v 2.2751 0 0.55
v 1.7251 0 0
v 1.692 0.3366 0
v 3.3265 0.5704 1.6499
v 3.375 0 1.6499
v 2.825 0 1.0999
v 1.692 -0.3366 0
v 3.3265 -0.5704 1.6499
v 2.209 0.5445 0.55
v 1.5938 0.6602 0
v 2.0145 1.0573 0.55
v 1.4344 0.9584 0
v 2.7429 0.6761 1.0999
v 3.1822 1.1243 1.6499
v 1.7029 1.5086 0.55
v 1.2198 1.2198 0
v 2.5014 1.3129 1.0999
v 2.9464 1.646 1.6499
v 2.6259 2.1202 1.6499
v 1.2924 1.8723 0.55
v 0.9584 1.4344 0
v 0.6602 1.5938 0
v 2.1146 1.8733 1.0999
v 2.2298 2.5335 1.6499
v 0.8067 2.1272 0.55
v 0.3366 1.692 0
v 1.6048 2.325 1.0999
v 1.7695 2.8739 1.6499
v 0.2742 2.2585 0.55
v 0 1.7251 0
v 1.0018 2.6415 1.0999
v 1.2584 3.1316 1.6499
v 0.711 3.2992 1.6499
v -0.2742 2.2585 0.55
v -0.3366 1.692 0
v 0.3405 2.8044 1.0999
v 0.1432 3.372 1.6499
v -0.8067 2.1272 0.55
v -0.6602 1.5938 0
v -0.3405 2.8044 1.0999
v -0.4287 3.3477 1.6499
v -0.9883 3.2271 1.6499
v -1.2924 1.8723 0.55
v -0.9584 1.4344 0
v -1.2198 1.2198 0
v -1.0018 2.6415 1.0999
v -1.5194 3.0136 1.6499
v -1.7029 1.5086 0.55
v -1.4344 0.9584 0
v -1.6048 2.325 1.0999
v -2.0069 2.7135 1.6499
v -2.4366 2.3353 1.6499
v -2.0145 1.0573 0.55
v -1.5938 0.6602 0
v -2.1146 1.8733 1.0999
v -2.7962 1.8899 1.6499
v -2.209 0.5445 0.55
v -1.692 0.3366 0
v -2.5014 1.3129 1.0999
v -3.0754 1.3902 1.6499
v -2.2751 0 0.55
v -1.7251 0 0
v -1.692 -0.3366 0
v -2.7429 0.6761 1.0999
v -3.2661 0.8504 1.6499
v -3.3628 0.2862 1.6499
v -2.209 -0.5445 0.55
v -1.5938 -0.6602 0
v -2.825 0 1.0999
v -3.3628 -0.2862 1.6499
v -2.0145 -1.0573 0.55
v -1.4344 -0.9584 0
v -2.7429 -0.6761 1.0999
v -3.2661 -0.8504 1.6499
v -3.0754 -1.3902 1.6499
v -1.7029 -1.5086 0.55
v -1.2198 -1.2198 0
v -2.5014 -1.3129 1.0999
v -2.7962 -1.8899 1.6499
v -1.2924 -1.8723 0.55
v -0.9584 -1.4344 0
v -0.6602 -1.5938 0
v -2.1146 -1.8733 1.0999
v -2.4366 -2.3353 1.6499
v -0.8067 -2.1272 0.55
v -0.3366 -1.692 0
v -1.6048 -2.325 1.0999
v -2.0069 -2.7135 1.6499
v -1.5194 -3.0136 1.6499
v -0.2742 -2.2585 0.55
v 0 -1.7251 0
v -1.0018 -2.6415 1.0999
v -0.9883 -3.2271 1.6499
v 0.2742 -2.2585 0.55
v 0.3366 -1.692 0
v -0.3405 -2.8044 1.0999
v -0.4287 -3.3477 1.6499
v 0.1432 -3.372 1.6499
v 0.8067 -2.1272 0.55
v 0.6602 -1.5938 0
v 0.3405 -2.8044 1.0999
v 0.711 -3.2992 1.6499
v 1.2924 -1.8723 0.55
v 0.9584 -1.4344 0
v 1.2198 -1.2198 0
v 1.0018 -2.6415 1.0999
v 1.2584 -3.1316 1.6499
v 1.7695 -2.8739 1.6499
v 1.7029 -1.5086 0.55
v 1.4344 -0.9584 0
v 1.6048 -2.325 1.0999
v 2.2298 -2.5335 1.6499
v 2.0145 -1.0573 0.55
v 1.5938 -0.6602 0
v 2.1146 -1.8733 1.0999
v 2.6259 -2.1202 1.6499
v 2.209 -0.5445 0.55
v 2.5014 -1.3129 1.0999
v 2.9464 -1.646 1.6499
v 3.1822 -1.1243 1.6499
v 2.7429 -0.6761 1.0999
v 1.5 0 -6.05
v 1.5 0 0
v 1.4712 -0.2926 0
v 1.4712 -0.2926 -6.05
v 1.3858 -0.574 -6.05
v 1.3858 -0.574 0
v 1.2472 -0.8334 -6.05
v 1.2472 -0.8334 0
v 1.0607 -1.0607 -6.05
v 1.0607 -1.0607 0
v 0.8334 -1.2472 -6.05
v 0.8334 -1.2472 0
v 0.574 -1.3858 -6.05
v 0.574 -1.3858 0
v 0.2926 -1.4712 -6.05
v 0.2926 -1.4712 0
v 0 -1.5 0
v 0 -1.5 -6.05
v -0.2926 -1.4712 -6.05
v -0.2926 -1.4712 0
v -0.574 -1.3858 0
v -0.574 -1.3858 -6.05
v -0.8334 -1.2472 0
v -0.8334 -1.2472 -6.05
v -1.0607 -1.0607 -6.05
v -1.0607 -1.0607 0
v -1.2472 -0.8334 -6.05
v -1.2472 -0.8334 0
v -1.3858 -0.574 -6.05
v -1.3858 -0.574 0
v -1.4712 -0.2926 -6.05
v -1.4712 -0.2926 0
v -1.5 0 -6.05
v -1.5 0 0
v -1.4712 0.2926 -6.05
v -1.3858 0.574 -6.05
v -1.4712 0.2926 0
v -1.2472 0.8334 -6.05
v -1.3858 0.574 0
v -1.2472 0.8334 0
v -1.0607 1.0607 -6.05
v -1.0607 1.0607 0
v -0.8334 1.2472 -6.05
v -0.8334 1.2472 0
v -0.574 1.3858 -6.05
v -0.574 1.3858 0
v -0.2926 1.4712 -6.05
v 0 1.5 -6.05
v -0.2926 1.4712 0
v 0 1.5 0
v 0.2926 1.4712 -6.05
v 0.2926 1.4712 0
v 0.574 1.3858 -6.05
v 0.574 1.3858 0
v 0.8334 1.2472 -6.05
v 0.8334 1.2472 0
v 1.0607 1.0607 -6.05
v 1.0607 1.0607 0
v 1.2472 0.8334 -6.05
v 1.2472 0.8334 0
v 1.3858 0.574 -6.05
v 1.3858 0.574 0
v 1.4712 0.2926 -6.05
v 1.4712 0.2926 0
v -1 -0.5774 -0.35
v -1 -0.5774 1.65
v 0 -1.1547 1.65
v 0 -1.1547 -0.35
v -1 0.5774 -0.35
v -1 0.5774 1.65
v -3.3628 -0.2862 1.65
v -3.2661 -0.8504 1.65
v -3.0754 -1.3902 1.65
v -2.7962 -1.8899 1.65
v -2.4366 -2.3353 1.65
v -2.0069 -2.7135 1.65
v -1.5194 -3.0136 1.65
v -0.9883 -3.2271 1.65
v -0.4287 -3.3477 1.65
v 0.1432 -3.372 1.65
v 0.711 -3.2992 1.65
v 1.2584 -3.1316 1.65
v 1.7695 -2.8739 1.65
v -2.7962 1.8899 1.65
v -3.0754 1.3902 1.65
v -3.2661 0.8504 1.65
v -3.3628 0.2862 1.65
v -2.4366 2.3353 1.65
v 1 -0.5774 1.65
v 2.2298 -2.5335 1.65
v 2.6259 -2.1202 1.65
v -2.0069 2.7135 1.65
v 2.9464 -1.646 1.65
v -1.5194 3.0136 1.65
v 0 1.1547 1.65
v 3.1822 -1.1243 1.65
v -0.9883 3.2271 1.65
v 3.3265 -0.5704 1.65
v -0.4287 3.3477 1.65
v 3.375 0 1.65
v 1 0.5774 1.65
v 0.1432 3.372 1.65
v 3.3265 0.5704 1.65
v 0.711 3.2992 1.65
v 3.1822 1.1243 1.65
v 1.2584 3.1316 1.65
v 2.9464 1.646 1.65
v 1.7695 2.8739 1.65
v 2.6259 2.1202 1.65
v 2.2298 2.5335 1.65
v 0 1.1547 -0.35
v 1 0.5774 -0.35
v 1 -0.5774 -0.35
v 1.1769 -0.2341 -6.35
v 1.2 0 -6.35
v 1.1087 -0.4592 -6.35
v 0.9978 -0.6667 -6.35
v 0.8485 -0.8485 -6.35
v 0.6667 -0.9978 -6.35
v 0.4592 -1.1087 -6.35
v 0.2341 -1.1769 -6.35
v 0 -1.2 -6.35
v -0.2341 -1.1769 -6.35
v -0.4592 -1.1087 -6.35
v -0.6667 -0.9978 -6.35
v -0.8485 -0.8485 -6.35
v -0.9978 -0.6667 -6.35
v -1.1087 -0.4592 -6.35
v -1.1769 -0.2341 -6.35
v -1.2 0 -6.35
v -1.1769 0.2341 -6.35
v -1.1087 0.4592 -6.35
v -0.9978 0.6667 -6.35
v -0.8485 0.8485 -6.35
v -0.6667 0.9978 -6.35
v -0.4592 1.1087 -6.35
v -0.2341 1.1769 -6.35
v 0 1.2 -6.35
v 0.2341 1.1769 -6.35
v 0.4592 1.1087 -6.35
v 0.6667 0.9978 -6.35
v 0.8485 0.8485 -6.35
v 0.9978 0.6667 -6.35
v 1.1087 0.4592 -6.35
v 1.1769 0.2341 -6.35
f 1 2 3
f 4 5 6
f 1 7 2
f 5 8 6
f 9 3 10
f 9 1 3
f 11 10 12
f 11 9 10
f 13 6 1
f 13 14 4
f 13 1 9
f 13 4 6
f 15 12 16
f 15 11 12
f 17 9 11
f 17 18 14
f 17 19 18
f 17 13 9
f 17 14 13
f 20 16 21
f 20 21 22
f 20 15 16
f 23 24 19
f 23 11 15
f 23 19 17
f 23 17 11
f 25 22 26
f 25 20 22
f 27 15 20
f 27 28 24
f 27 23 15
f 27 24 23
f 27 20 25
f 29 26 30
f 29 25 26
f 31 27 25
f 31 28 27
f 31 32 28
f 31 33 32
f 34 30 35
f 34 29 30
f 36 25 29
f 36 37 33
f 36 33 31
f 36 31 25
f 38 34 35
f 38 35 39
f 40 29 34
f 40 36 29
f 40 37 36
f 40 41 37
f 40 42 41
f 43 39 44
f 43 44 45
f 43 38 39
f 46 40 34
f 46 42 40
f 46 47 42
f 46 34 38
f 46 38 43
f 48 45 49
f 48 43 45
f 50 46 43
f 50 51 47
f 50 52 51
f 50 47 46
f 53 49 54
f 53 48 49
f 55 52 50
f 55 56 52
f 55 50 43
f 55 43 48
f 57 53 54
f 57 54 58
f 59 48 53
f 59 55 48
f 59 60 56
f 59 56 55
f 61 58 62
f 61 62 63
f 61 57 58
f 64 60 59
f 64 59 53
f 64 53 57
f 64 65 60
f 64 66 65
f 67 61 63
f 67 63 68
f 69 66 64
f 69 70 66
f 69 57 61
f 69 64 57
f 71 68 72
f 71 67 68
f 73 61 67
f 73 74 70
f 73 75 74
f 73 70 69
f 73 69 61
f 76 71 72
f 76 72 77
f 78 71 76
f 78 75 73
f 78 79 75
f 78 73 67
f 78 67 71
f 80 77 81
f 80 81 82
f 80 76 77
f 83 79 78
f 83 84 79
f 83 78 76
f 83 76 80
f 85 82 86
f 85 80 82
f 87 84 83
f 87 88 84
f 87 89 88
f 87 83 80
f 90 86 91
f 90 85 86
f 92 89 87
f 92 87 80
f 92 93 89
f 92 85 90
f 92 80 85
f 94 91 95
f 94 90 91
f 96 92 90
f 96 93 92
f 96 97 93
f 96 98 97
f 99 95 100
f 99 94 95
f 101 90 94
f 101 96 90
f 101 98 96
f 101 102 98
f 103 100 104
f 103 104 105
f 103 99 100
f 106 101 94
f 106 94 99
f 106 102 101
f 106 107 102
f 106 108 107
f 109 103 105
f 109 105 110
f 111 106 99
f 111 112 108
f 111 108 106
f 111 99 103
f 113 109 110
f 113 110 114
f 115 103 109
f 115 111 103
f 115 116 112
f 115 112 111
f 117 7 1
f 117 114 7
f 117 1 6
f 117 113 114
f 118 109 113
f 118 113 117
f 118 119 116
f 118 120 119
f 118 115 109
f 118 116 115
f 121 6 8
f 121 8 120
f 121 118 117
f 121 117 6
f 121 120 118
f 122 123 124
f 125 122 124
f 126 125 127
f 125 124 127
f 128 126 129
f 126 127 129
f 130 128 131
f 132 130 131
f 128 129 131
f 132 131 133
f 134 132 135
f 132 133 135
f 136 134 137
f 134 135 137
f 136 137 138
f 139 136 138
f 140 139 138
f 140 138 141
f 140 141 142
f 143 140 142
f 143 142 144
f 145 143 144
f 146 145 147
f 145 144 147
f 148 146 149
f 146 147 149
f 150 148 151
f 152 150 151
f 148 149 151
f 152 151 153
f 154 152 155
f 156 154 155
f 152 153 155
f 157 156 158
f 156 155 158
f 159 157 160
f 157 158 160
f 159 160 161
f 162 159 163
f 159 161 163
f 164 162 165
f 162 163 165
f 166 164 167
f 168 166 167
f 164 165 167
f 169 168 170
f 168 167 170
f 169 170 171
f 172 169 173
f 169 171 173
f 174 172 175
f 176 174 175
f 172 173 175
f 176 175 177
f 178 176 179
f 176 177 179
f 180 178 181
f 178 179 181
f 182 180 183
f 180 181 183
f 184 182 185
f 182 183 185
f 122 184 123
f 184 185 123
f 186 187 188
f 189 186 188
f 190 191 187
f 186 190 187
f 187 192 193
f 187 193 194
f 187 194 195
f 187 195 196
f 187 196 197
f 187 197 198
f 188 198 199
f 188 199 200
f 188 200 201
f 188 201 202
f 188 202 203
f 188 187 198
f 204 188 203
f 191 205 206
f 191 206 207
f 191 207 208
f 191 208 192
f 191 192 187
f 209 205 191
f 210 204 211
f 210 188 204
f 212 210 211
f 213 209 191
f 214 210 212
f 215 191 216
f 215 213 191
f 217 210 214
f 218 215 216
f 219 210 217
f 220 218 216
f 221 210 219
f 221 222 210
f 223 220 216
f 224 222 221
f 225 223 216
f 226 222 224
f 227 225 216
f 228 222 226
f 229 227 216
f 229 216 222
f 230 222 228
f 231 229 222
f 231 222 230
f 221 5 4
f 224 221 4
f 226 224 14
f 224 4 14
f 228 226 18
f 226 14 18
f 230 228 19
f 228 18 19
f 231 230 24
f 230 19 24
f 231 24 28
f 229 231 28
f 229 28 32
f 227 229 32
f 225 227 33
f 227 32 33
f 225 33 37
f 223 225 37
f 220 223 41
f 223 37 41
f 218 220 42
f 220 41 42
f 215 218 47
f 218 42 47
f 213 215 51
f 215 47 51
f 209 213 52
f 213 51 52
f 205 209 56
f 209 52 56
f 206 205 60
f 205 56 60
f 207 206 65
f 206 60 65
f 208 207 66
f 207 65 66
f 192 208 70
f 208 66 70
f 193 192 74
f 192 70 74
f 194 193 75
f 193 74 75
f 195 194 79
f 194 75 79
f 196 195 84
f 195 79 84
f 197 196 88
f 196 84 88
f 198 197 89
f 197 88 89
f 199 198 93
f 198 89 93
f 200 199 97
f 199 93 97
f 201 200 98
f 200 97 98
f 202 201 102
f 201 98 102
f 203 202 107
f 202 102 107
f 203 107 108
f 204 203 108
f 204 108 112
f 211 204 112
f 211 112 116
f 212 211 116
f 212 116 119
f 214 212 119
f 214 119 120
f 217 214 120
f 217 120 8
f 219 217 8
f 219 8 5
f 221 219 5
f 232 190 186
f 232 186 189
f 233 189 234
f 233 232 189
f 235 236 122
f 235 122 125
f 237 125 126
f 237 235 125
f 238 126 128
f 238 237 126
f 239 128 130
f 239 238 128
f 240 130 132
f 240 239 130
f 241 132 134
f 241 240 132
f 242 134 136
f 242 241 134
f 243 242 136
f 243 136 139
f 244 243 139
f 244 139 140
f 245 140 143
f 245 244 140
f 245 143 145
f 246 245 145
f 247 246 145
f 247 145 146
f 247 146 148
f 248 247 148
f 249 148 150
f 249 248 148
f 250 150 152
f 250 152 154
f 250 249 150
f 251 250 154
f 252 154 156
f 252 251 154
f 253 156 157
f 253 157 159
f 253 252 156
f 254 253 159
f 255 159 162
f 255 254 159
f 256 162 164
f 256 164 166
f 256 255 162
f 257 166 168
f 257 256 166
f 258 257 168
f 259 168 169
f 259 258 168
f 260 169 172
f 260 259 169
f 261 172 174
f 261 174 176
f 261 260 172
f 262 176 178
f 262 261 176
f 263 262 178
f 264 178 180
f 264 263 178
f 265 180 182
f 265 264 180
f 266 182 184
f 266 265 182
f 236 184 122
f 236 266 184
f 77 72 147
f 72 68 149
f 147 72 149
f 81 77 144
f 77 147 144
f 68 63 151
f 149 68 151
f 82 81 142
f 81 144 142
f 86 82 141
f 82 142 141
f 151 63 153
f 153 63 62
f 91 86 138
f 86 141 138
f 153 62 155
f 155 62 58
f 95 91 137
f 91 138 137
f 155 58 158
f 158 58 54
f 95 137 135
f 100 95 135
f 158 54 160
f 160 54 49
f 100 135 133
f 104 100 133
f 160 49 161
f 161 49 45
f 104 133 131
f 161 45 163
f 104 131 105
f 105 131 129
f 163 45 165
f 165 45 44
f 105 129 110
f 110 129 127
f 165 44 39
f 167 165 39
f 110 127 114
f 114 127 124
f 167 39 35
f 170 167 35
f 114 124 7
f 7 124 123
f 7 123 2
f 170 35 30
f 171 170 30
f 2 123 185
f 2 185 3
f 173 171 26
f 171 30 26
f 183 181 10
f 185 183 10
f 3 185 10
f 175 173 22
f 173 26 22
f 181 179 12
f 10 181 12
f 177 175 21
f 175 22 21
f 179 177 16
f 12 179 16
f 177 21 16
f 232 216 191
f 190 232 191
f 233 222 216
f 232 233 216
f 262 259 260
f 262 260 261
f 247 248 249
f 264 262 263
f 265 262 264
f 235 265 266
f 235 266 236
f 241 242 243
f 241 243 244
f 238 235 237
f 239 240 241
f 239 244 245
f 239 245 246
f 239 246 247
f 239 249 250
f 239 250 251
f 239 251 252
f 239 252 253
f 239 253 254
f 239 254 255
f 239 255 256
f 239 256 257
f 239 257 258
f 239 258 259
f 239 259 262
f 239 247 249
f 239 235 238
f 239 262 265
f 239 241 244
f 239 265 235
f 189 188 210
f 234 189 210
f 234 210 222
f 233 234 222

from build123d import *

# Parameters (mm, degrees)
SKETCH1_R           = 3.375
BOSS_EXTRUDE1_DEPTH = 1.65
SKETCH2_R           = 1.5
BOSS_EXTRUDE2_DEPTH = 6.35
CHAMFER1_SIZE       = 0.3
CUT_EXTRUDE1_DEPTH  = 2
CHAMFER2_SIZE       = 1.65


with BuildPart() as part:
    # Sketch1 → Boss-Extrude1 (new body)
    with BuildSketch(Plane.XY):
        Circle(SKETCH1_R)
    extrude(amount=BOSS_EXTRUDE1_DEPTH)

    # Sketch2 → Boss-Extrude2 (add)
    with BuildSketch(Plane(origin=(0, 0, 0), x_dir=(-1, 0, 0), z_dir=(0, 0, -1))):
        with Locations(Location((0, 0, 0), (0, 0, 180))):
            Circle(SKETCH2_R)
    extrude(amount=BOSS_EXTRUDE2_DEPTH)

    # Chamfer1
    chamfer1_edges = [part.edges().sort_by_distance(p)[0] for p in [
        (-1.5, 0, -6.35),
    ]]
    chamfer(chamfer1_edges, length=CHAMFER1_SIZE)

    # Sketch3 → Cut-Extrude1 (cut)
    with BuildSketch(Plane.XY.offset(1.65)):
        Polygon((0, 1.154700538), (-1, 0.577350269), (-1, -0.577350269), (0, -1.154700538), (1, -0.577350269), (1, 0.577350269), align=None)
    extrude(amount=-CUT_EXTRUDE1_DEPTH, mode=Mode.SUBTRACT)

    # Chamfer2
    chamfer2_edges = [part.edges().sort_by_distance(p)[0] for p in [
        (-3.375, 0, 0),
    ]]
    chamfer(chamfer2_edges, length=CHAMFER2_SIZE - 0.0001)  # a hair under: the kernel refuses the full size


solid = part.part
